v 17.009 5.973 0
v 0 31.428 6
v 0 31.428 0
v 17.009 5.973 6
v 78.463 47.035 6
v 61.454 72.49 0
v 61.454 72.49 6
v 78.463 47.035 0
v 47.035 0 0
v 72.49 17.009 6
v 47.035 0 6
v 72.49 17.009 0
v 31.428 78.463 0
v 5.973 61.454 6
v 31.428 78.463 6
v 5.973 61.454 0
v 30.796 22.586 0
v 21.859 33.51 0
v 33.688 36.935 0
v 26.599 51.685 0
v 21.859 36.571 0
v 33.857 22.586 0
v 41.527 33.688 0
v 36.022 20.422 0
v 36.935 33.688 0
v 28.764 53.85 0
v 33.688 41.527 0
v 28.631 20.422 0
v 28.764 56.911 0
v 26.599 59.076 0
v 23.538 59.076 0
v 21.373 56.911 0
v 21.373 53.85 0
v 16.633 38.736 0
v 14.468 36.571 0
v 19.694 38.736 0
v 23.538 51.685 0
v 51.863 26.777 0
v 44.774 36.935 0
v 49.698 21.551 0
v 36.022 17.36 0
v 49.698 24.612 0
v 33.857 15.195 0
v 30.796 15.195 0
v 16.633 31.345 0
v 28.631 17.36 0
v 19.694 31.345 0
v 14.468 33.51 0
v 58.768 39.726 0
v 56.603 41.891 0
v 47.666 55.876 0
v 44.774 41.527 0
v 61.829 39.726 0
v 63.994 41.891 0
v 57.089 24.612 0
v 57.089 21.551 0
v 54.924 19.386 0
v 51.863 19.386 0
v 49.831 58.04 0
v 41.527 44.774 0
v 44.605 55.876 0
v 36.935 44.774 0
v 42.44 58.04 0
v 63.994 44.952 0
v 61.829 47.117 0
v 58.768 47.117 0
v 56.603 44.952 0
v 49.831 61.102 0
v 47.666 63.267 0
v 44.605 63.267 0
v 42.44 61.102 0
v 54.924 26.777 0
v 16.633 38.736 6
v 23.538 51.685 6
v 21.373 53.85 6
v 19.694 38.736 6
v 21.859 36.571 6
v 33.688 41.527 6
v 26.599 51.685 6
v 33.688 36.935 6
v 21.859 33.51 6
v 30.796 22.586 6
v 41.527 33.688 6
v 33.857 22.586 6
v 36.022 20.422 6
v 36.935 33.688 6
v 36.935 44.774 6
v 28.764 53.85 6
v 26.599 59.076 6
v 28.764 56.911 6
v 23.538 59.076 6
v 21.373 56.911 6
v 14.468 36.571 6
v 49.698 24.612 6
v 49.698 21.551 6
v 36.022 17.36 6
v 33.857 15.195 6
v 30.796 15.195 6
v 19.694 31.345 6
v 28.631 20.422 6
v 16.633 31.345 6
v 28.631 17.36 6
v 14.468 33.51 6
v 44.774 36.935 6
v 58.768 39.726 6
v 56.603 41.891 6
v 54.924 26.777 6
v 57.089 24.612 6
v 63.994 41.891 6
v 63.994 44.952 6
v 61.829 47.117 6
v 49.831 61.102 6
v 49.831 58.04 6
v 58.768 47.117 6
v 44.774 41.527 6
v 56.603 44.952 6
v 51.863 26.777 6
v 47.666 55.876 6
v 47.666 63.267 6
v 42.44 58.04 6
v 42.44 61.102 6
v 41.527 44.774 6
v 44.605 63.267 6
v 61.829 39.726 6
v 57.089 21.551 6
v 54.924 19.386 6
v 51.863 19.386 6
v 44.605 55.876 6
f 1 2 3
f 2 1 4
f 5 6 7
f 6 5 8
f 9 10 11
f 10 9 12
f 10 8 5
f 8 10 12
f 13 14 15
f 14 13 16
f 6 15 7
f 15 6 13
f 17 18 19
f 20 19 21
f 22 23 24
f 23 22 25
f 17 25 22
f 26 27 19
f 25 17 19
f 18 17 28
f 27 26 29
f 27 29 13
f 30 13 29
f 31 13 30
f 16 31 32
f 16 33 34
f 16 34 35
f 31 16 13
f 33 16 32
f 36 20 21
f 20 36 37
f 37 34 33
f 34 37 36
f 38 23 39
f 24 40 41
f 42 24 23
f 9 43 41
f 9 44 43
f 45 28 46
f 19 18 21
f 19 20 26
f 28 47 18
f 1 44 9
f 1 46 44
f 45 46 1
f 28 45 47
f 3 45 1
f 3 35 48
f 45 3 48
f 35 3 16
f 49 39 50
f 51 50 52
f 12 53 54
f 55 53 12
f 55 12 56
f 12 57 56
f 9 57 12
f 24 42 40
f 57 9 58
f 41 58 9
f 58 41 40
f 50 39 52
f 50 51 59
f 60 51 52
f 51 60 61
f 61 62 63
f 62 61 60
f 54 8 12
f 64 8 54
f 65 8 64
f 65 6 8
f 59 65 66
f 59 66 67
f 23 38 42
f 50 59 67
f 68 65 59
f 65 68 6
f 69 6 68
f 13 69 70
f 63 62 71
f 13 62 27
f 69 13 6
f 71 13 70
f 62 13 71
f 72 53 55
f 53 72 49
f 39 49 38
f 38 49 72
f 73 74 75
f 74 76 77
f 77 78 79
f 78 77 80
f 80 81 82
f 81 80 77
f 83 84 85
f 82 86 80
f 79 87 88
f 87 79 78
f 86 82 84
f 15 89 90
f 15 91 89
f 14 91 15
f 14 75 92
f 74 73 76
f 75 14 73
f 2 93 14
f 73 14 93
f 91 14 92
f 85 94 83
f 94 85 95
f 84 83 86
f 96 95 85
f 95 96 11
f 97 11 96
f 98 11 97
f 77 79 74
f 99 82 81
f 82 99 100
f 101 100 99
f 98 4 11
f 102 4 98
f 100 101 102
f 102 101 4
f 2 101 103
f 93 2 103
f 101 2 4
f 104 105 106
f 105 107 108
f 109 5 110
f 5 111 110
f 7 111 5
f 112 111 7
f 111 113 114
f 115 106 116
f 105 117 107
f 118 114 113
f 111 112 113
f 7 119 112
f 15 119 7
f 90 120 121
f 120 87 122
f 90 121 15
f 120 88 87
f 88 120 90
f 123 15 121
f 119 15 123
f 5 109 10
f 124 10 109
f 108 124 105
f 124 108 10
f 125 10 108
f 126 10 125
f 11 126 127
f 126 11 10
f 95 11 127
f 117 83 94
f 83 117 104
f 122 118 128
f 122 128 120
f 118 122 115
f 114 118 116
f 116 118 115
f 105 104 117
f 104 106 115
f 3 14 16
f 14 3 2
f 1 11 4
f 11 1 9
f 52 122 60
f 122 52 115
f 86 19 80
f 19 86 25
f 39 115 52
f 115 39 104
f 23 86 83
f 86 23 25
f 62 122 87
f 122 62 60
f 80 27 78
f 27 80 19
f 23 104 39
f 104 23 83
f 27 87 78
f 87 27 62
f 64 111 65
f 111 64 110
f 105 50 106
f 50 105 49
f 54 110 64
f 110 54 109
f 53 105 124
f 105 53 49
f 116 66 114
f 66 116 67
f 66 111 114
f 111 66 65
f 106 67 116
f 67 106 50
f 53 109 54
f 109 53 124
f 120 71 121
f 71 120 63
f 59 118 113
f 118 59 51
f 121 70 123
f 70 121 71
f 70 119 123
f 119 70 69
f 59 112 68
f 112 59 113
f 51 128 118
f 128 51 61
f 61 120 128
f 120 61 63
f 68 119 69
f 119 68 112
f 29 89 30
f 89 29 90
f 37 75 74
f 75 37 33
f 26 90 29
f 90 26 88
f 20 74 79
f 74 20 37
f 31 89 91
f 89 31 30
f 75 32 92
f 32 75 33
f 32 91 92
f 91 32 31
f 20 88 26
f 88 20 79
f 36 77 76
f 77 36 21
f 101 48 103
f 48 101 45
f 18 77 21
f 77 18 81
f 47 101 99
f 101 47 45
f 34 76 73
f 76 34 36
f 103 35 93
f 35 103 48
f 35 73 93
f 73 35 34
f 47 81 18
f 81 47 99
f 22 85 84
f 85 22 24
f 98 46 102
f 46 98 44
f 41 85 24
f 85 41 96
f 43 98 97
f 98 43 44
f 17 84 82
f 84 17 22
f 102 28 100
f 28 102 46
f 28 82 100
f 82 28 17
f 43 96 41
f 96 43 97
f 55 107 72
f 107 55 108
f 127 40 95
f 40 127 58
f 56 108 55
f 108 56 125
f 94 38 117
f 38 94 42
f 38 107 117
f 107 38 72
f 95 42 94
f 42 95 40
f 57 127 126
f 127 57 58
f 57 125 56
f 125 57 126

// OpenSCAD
$fn = 32;

// ----------------------------------------------------------------------
// Polygon plate: 8-gon R40, 6 bolt windows
// ----------------------------------------------------------------------

// --- parameters (mm) ---
sides = 8;                // number of polygon sides
plate_r = 40;             // circumscribed radius of the polygon
bore_r = 6;               // centre bore radius
bolts = 6;                // number of bolt windows
ring_r = 21.48;           // bolt-circle radius
bolt_r = 4;               // bolt window radius
plate_t = 6;              // plate thickness, Z (extrusion height)

plate_d = 2 * plate_r;  // circumscribed diameter
bore_d = 2 * bore_r;  // centre bore diameter
bolt_d = 2 * bolt_r;  // bolt window diameter
ring_d = 2 * ring_r;  // bolt-circle diameter

profile = [[78.463, 47.035], [61.454, 72.49], [31.428, 78.463], [5.973, 61.454], [0, 31.428], [17.009, 5.973], [47.035, 0], [72.49, 17.009]];  // primary outline, 8 points, counter clockwise
void_1 = [[44.774, 41.527], [41.527, 44.774], [36.935, 44.774], [33.688, 41.527], [33.688, 36.935], [36.935, 33.688], [41.527, 33.688], [44.774, 36.935]];  // centre bore, 8 points
void_2 = [[63.994, 44.952], [61.829, 47.117], [58.768, 47.117], [56.603, 44.952], [56.603, 41.891], [58.768, 39.726], [61.829, 39.726], [63.994, 41.891]];  // bolt window 1, 8 points
void_3 = [[49.831, 61.102], [47.666, 63.267], [44.605, 63.267], [42.44, 61.102], [42.44, 58.04], [44.605, 55.876], [47.666, 55.876], [49.831, 58.04]];  // bolt window 2, 8 points
void_4 = [[28.764, 56.911], [26.599, 59.076], [23.538, 59.076], [21.373, 56.911], [21.373, 53.85], [23.538, 51.685], [26.599, 51.685], [28.764, 53.85]];  // bolt window 3, 8 points
void_5 = [[21.859, 36.571], [19.694, 38.736], [16.633, 38.736], [14.468, 36.571], [14.468, 33.51], [16.633, 31.345], [19.694, 31.345], [21.859, 33.51]];  // bolt window 4, 8 points
void_6 = [[36.022, 20.422], [33.857, 22.586], [30.796, 22.586], [28.631, 20.422], [28.631, 17.36], [30.796, 15.195], [33.857, 15.195], [36.022, 17.36]];  // bolt window 5, 8 points
void_7 = [[57.089, 24.612], [54.924, 26.777], [51.863, 26.777], [49.698, 24.612], [49.698, 21.551], [51.863, 19.386], [54.924, 19.386], [57.089, 21.551]];  // bolt window 6, 8 points

// --- the one profile operation ---
difference() {
  linear_extrude(height = plate_t) polygon(points = profile);
  translate([0, 0, -1])
    linear_extrude(height = plate_t + 2) polygon(points = void_1);
  translate([0, 0, -1])
    linear_extrude(height = plate_t + 2) polygon(points = void_2);
  translate([0, 0, -1])
    linear_extrude(height = plate_t + 2) polygon(points = void_3);
  translate([0, 0, -1])
    linear_extrude(height = plate_t + 2) polygon(points = void_4);
  translate([0, 0, -1])
    linear_extrude(height = plate_t + 2) polygon(points = void_5);
  translate([0, 0, -1])
    linear_extrude(height = plate_t + 2) polygon(points = void_6);
  translate([0, 0, -1])
    linear_extrude(height = plate_t + 2) polygon(points = void_7);
}
